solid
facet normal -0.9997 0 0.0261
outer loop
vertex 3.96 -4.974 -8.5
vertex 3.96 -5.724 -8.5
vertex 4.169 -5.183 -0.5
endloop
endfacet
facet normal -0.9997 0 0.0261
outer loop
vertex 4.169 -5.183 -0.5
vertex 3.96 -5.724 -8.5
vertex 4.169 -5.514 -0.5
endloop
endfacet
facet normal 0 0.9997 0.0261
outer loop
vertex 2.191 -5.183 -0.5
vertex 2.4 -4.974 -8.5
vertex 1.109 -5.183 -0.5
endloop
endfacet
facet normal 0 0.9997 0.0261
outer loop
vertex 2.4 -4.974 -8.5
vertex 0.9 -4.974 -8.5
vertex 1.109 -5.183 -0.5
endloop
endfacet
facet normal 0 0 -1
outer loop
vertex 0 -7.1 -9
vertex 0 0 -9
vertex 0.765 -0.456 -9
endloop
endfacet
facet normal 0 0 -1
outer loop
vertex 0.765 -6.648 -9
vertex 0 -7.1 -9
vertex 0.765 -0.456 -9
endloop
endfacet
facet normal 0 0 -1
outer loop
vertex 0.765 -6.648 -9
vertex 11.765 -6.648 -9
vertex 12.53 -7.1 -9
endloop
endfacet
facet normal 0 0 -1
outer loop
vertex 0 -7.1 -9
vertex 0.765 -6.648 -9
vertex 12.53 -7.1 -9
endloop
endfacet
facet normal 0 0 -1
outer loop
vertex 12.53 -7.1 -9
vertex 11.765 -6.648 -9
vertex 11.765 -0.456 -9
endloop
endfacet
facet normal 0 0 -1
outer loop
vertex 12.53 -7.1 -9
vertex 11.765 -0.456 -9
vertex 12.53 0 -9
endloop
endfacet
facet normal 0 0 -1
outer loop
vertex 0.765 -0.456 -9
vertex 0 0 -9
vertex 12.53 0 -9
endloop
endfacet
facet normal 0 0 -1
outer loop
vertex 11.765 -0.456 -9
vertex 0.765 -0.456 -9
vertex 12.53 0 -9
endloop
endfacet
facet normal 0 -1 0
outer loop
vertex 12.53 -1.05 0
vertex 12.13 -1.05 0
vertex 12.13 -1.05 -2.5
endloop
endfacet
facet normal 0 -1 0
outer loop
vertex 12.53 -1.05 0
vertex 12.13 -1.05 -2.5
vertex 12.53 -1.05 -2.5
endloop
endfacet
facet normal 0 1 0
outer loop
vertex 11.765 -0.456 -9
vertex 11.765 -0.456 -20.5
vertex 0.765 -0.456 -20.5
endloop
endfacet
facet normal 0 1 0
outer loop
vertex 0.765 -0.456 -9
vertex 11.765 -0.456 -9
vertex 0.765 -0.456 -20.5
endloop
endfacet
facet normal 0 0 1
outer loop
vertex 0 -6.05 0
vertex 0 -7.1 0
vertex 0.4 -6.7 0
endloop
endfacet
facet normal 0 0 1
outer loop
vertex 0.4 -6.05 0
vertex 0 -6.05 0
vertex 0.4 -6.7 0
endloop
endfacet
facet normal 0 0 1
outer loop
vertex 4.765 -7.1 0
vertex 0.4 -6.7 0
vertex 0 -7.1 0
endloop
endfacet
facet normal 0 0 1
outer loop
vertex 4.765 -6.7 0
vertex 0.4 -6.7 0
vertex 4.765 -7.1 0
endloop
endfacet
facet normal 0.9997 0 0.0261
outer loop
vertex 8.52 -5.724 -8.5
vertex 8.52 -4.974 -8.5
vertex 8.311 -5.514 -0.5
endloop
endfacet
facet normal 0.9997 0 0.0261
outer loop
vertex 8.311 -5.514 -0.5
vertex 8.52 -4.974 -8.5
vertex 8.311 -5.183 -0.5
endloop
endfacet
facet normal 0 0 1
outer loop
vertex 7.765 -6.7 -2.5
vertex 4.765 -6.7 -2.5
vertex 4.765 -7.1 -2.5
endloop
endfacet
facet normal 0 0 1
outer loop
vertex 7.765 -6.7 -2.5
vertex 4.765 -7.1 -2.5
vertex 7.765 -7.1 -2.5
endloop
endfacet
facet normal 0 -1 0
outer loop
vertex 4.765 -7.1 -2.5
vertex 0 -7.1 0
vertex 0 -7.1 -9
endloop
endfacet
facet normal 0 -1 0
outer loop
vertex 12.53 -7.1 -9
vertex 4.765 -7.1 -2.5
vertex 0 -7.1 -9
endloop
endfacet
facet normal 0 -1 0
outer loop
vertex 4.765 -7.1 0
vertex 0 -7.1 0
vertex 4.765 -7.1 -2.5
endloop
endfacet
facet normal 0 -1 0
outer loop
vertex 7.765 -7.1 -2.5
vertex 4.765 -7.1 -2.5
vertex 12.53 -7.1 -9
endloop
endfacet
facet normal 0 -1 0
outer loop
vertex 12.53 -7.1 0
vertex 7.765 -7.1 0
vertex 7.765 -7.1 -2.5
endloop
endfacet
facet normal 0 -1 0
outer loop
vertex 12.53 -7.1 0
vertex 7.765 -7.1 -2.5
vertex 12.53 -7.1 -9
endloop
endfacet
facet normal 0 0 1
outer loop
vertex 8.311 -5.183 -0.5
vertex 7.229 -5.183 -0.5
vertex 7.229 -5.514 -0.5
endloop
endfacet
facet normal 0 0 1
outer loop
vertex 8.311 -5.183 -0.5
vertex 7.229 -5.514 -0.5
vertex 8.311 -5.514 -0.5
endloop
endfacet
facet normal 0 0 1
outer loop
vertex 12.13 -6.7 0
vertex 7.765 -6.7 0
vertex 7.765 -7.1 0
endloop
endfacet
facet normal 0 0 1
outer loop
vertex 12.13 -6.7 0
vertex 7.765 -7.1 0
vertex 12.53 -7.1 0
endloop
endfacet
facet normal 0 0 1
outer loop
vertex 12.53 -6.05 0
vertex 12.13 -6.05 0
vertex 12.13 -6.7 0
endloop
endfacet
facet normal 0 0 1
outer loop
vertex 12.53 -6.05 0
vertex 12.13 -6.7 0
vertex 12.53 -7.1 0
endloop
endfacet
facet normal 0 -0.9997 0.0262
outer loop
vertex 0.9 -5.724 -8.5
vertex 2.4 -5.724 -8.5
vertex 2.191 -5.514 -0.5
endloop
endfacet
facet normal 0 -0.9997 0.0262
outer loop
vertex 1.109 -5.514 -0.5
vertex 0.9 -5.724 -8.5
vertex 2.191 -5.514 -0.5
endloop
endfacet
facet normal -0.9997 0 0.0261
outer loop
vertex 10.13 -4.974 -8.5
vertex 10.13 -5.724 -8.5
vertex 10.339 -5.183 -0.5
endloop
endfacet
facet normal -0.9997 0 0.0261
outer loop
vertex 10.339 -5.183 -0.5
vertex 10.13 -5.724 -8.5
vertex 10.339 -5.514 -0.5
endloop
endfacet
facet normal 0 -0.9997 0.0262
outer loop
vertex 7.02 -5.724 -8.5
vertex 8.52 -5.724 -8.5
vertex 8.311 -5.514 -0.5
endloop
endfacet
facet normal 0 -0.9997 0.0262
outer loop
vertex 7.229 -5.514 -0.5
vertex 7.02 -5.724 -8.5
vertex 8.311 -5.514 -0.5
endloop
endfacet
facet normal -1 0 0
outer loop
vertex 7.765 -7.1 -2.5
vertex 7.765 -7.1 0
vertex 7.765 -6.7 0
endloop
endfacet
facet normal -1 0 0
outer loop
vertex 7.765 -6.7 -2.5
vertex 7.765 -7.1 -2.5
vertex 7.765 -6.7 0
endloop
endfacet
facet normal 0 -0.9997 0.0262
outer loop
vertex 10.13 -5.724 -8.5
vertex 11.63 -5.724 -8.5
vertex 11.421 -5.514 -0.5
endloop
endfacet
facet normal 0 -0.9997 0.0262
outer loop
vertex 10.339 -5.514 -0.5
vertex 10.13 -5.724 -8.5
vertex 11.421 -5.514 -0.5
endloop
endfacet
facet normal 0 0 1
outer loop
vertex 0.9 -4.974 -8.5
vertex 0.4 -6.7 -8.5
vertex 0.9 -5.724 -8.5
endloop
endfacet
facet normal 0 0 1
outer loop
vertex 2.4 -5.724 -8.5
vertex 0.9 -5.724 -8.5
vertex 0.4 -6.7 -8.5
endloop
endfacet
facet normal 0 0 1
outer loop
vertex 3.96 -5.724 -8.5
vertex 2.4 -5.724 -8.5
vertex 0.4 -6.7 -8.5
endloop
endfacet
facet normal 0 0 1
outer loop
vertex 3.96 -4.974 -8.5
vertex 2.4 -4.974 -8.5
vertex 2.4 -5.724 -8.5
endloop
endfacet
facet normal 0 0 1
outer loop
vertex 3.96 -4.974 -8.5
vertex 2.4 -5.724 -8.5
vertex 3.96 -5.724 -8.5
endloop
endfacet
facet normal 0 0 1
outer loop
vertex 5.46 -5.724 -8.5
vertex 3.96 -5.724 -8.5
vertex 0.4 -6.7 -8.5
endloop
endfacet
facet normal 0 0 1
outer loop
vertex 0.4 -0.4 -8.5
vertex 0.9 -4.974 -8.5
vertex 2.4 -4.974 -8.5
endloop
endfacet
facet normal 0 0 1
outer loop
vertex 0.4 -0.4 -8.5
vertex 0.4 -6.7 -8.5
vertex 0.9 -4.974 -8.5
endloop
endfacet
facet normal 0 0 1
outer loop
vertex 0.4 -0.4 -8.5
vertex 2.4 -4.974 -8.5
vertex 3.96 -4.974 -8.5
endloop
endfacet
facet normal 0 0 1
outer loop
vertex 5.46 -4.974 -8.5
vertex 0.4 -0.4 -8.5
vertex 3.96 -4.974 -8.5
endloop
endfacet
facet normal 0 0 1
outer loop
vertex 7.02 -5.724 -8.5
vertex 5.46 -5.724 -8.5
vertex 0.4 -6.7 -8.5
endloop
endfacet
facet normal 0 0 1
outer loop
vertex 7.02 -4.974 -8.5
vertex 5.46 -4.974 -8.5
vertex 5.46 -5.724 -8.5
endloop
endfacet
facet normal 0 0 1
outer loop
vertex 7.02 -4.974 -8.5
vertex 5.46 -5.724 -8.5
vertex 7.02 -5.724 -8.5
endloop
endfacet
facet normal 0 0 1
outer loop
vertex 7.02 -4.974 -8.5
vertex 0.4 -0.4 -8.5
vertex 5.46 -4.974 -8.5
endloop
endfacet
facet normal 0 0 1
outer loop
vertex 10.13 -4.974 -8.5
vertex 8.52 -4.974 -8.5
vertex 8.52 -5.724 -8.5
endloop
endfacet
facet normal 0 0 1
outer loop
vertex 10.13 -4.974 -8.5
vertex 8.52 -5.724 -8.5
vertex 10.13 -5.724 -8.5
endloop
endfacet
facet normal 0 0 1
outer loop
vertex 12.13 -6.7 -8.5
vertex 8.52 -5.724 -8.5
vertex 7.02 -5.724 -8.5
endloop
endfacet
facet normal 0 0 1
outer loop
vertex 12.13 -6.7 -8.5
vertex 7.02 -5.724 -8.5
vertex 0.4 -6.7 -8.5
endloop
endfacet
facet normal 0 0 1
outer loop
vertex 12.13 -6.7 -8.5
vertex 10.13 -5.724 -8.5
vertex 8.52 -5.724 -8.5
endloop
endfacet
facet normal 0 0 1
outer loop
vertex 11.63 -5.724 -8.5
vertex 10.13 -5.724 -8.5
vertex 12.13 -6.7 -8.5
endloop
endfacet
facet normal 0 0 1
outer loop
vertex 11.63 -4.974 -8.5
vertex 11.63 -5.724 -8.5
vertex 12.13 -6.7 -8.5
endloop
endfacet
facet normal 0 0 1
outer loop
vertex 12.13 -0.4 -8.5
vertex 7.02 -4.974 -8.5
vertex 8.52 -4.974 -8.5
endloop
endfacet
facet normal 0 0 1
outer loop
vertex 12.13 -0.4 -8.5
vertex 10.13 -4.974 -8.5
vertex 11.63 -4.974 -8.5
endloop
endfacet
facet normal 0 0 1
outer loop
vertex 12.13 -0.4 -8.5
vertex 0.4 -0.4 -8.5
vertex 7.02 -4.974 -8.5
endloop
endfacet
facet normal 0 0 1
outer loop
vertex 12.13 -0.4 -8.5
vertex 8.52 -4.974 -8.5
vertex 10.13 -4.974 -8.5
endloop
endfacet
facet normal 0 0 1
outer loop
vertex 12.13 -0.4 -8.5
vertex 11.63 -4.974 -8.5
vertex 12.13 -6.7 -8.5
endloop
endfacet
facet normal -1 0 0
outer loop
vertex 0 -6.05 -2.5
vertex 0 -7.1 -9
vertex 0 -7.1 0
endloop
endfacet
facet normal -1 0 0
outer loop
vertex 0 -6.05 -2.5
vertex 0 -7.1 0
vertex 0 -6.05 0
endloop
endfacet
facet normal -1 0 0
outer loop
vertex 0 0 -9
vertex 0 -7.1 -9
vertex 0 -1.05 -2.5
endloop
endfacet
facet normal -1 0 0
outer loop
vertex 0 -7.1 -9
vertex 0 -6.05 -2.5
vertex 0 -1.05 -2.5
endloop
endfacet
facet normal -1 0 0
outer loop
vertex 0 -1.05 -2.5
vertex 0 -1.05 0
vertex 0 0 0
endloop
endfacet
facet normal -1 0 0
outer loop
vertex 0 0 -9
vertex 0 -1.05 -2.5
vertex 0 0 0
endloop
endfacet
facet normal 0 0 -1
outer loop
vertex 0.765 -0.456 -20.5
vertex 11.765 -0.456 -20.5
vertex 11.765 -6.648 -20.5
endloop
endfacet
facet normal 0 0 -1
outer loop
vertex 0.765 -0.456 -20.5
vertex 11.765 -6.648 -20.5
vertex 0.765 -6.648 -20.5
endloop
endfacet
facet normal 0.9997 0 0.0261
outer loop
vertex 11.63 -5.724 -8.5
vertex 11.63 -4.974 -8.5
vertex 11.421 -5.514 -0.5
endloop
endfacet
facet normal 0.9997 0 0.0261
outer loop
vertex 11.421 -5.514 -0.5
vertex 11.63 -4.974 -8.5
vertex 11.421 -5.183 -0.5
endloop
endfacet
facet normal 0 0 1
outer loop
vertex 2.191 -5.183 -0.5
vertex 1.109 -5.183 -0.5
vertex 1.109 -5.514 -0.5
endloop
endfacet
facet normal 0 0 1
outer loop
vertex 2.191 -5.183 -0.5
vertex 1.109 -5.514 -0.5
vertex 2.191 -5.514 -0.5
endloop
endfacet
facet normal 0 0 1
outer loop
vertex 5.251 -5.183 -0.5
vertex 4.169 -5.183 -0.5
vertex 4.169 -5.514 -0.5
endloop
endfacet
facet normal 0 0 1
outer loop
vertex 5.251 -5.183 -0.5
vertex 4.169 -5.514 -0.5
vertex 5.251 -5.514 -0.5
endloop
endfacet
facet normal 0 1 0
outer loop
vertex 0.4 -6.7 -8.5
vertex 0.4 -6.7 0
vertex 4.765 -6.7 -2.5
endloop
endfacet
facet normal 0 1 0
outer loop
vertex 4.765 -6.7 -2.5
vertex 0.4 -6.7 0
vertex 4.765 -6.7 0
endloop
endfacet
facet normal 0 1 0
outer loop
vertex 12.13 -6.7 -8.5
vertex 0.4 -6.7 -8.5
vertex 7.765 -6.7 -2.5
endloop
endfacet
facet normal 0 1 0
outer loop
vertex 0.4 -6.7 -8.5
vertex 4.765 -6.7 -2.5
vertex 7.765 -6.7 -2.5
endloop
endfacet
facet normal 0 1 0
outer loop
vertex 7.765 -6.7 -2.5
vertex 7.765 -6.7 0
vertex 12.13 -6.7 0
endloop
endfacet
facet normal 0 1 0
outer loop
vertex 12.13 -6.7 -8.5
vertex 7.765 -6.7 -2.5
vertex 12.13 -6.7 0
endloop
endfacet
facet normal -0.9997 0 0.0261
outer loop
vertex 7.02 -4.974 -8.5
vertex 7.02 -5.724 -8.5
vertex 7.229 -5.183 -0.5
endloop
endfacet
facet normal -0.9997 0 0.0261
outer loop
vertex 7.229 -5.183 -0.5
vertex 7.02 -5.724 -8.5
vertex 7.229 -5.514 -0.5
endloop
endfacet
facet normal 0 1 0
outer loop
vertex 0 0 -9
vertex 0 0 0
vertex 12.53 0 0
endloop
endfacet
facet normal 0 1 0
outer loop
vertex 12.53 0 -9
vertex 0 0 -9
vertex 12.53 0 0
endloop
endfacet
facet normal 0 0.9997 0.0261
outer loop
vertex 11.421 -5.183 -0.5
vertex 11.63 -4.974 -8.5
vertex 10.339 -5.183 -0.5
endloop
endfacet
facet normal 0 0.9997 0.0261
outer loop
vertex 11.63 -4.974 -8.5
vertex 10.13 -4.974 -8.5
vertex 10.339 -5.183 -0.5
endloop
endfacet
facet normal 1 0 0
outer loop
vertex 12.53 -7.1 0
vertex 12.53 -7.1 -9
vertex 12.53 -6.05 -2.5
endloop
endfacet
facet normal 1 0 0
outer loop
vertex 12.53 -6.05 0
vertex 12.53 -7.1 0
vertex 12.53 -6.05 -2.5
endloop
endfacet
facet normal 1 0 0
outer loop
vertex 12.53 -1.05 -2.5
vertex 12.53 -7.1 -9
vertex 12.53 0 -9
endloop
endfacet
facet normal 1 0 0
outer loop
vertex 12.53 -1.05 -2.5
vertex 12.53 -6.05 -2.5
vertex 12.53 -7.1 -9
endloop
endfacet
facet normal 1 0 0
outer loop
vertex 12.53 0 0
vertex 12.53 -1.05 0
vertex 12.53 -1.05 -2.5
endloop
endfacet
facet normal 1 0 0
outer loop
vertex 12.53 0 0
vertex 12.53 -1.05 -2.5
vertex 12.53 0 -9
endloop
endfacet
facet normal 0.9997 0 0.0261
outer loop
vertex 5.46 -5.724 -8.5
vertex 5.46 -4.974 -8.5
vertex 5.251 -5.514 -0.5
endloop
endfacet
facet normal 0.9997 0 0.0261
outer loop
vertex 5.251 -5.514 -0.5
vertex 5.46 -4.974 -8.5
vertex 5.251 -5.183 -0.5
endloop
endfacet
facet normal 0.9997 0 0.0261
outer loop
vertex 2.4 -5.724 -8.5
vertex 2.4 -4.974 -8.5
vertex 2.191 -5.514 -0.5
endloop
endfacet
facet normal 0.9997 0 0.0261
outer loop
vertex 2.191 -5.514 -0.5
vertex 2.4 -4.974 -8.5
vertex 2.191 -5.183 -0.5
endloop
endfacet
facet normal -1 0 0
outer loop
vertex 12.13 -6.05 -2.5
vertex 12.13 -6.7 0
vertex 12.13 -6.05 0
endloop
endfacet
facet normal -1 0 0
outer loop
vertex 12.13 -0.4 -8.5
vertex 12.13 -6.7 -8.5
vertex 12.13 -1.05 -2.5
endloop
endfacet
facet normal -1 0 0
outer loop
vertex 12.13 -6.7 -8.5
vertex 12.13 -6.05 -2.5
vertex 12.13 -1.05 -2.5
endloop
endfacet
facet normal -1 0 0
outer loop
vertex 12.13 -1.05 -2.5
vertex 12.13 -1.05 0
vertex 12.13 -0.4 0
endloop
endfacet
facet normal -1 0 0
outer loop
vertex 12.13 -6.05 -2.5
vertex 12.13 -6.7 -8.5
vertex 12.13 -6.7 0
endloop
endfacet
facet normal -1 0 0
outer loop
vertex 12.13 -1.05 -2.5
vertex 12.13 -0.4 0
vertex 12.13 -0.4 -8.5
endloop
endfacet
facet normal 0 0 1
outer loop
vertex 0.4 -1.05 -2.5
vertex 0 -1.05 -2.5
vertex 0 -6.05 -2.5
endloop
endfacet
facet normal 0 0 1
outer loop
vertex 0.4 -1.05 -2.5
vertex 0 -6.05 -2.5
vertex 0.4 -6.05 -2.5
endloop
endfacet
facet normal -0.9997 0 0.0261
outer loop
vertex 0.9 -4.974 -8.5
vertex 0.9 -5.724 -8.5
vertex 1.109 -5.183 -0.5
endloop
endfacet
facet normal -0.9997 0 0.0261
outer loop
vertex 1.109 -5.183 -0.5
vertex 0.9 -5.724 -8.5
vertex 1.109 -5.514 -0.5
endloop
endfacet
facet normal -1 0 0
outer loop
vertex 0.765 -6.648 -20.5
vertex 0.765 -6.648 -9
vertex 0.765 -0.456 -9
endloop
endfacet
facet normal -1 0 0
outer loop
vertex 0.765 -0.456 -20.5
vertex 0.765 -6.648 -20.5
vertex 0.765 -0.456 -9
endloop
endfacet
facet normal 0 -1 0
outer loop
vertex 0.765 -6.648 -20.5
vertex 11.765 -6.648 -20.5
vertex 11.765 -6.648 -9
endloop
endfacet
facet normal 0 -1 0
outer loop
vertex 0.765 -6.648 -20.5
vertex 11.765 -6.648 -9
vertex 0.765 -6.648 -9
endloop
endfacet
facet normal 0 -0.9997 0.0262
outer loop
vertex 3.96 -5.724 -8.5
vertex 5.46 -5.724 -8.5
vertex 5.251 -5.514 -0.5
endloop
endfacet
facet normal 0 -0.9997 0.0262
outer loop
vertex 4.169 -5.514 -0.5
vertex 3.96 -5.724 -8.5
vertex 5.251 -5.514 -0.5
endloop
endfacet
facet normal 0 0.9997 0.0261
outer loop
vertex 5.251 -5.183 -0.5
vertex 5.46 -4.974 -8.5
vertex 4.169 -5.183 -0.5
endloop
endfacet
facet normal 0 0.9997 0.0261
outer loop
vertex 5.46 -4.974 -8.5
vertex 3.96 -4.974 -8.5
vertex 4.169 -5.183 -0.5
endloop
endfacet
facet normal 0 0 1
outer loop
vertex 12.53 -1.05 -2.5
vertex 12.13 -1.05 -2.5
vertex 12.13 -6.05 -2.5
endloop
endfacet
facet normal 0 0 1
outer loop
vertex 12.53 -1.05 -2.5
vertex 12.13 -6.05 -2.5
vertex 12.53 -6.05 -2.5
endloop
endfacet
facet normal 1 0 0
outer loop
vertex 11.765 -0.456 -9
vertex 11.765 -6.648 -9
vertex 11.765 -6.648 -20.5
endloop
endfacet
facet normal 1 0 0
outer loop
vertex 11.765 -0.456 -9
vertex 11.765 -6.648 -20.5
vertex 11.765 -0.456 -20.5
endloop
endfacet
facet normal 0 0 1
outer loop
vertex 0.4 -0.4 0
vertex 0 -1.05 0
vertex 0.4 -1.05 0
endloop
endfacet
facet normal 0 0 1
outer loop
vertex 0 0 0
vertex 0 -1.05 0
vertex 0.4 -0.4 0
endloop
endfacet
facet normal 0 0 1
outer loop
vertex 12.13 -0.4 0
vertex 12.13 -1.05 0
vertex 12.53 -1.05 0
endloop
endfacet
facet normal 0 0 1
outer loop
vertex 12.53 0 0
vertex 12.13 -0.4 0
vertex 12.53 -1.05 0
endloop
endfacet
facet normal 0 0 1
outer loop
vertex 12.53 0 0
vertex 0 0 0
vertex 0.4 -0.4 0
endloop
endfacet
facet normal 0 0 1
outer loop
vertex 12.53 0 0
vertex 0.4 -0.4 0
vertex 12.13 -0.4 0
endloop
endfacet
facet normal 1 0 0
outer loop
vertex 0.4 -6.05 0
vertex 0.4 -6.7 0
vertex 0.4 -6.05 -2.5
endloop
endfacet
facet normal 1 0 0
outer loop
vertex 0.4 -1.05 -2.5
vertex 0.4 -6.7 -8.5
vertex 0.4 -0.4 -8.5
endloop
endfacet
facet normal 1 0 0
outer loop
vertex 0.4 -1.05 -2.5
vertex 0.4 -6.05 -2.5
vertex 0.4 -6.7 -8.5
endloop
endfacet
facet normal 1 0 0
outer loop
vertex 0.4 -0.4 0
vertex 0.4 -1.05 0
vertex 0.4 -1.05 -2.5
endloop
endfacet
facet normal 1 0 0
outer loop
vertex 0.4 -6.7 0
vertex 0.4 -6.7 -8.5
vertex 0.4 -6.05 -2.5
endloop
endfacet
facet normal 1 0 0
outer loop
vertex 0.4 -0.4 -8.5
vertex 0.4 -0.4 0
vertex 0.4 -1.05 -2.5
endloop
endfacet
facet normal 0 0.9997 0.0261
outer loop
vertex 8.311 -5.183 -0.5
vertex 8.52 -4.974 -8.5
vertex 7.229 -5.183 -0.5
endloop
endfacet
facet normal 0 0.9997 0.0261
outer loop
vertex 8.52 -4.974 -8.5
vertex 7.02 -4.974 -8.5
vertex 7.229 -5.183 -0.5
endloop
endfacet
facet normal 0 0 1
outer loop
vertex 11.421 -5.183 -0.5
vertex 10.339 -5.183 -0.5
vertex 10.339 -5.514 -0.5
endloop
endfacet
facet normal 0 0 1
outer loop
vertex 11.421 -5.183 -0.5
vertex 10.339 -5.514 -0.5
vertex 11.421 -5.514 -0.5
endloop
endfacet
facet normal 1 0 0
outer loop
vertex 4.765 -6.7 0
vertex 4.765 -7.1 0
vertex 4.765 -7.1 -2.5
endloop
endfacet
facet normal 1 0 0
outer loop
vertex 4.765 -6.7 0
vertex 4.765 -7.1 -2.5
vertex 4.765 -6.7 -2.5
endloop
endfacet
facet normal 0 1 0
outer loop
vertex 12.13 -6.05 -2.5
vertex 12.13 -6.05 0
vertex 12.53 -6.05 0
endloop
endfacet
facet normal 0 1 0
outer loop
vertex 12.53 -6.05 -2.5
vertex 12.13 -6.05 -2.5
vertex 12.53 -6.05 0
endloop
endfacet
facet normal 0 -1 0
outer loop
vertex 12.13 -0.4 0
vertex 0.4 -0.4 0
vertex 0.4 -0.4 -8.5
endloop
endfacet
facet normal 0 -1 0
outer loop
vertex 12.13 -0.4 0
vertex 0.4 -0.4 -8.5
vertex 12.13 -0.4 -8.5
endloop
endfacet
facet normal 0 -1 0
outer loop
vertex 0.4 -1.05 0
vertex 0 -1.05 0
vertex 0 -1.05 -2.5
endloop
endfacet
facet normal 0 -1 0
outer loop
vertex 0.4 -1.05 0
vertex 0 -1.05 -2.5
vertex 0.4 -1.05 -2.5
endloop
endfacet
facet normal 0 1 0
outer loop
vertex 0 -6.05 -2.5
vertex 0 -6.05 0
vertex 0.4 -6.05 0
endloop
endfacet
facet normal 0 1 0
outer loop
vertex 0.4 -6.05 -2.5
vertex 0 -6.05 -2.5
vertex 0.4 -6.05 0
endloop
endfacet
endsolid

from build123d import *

# Parameters (mm, degrees)
SKETCH1_W           = 12.53
SKETCH1_H           = 7.1
BOSS_EXTRUDE1_DEPTH = 9
SKETCH2_W           = 11.73
SKETCH2_H           = 6.3
CUT_EXTRUDE1_DEPTH  = 8.5
SKETCH4_W           = 0.4
SKETCH4_H           = 5
SKETCH4_W_2         = 0.402982855
SKETCH4_W_3         = 3
SKETCH4_H_2         = 0.4
CUT_EXTRUDE3_DEPTH  = 2.5
SKETCH5_W           = 1.5
SKETCH5_H           = 0.750222952
BOSS_EXTRUDE4_DEPTH = 8
BOSS_EXTRUDE4_TAPER = 1.5
SKETCH8_W           = 11
SKETCH8_H           = 6.192617785
BOSS_EXTRUDE5_DEPTH = 11.5


with BuildPart() as part:
    # Sketch1 → Boss-Extrude1 (new body)
    with BuildSketch(Plane.XY):
        with Locations((6.265, -3.55)):
            Rectangle(SKETCH1_W, SKETCH1_H)
    extrude(amount=-BOSS_EXTRUDE1_DEPTH)

    # Sketch2 → Cut-Extrude1 (cut)
    with BuildSketch(Plane.XY):
        with Locations((6.265, -3.55)):
            Rectangle(SKETCH2_W, SKETCH2_H)
    extrude(amount=-CUT_EXTRUDE1_DEPTH, mode=Mode.SUBTRACT)

    # Sketch4 → Cut-Extrude3 (cut)
    with BuildSketch(Plane.XY):
        with Locations((0.2, -3.55)):
            Rectangle(SKETCH4_W, SKETCH4_H)
        with Locations((12.328508573, -3.55)):
            Rectangle(SKETCH4_W_2, SKETCH4_H)
        with Locations((6.265, -6.9)):
            Rectangle(SKETCH4_W_3, SKETCH4_H_2)
    extrude(amount=-CUT_EXTRUDE3_DEPTH, mode=Mode.SUBTRACT)

    # Sketch5 → Boss-Extrude4 (add)
    with BuildSketch(Plane.XY.offset(-8.5)):
        with Locations((1.65, -5.348826407)):
            Rectangle(SKETCH5_W, SKETCH5_H)
        with Locations((4.71, -5.348826407)):
            Rectangle(SKETCH5_W, SKETCH5_H)
        with Locations((7.77, -5.348826407)):
            Rectangle(SKETCH5_W, SKETCH5_H)
        with Locations((10.88, -5.348826407)):
            Rectangle(SKETCH5_W, SKETCH5_H)
    extrude(amount=BOSS_EXTRUDE4_DEPTH, taper=BOSS_EXTRUDE4_TAPER)

    # Sketch8 → Boss-Extrude5 (add)
    with BuildSketch(Plane(origin=(0, 0, -9), x_dir=(-1, 0, 0), z_dir=(0, 0, -1))):
        with Locations((-6.265, -3.552075665)):
            Rectangle(SKETCH8_W, SKETCH8_H)
    extrude(amount=BOSS_EXTRUDE5_DEPTH)


solid = part.part
